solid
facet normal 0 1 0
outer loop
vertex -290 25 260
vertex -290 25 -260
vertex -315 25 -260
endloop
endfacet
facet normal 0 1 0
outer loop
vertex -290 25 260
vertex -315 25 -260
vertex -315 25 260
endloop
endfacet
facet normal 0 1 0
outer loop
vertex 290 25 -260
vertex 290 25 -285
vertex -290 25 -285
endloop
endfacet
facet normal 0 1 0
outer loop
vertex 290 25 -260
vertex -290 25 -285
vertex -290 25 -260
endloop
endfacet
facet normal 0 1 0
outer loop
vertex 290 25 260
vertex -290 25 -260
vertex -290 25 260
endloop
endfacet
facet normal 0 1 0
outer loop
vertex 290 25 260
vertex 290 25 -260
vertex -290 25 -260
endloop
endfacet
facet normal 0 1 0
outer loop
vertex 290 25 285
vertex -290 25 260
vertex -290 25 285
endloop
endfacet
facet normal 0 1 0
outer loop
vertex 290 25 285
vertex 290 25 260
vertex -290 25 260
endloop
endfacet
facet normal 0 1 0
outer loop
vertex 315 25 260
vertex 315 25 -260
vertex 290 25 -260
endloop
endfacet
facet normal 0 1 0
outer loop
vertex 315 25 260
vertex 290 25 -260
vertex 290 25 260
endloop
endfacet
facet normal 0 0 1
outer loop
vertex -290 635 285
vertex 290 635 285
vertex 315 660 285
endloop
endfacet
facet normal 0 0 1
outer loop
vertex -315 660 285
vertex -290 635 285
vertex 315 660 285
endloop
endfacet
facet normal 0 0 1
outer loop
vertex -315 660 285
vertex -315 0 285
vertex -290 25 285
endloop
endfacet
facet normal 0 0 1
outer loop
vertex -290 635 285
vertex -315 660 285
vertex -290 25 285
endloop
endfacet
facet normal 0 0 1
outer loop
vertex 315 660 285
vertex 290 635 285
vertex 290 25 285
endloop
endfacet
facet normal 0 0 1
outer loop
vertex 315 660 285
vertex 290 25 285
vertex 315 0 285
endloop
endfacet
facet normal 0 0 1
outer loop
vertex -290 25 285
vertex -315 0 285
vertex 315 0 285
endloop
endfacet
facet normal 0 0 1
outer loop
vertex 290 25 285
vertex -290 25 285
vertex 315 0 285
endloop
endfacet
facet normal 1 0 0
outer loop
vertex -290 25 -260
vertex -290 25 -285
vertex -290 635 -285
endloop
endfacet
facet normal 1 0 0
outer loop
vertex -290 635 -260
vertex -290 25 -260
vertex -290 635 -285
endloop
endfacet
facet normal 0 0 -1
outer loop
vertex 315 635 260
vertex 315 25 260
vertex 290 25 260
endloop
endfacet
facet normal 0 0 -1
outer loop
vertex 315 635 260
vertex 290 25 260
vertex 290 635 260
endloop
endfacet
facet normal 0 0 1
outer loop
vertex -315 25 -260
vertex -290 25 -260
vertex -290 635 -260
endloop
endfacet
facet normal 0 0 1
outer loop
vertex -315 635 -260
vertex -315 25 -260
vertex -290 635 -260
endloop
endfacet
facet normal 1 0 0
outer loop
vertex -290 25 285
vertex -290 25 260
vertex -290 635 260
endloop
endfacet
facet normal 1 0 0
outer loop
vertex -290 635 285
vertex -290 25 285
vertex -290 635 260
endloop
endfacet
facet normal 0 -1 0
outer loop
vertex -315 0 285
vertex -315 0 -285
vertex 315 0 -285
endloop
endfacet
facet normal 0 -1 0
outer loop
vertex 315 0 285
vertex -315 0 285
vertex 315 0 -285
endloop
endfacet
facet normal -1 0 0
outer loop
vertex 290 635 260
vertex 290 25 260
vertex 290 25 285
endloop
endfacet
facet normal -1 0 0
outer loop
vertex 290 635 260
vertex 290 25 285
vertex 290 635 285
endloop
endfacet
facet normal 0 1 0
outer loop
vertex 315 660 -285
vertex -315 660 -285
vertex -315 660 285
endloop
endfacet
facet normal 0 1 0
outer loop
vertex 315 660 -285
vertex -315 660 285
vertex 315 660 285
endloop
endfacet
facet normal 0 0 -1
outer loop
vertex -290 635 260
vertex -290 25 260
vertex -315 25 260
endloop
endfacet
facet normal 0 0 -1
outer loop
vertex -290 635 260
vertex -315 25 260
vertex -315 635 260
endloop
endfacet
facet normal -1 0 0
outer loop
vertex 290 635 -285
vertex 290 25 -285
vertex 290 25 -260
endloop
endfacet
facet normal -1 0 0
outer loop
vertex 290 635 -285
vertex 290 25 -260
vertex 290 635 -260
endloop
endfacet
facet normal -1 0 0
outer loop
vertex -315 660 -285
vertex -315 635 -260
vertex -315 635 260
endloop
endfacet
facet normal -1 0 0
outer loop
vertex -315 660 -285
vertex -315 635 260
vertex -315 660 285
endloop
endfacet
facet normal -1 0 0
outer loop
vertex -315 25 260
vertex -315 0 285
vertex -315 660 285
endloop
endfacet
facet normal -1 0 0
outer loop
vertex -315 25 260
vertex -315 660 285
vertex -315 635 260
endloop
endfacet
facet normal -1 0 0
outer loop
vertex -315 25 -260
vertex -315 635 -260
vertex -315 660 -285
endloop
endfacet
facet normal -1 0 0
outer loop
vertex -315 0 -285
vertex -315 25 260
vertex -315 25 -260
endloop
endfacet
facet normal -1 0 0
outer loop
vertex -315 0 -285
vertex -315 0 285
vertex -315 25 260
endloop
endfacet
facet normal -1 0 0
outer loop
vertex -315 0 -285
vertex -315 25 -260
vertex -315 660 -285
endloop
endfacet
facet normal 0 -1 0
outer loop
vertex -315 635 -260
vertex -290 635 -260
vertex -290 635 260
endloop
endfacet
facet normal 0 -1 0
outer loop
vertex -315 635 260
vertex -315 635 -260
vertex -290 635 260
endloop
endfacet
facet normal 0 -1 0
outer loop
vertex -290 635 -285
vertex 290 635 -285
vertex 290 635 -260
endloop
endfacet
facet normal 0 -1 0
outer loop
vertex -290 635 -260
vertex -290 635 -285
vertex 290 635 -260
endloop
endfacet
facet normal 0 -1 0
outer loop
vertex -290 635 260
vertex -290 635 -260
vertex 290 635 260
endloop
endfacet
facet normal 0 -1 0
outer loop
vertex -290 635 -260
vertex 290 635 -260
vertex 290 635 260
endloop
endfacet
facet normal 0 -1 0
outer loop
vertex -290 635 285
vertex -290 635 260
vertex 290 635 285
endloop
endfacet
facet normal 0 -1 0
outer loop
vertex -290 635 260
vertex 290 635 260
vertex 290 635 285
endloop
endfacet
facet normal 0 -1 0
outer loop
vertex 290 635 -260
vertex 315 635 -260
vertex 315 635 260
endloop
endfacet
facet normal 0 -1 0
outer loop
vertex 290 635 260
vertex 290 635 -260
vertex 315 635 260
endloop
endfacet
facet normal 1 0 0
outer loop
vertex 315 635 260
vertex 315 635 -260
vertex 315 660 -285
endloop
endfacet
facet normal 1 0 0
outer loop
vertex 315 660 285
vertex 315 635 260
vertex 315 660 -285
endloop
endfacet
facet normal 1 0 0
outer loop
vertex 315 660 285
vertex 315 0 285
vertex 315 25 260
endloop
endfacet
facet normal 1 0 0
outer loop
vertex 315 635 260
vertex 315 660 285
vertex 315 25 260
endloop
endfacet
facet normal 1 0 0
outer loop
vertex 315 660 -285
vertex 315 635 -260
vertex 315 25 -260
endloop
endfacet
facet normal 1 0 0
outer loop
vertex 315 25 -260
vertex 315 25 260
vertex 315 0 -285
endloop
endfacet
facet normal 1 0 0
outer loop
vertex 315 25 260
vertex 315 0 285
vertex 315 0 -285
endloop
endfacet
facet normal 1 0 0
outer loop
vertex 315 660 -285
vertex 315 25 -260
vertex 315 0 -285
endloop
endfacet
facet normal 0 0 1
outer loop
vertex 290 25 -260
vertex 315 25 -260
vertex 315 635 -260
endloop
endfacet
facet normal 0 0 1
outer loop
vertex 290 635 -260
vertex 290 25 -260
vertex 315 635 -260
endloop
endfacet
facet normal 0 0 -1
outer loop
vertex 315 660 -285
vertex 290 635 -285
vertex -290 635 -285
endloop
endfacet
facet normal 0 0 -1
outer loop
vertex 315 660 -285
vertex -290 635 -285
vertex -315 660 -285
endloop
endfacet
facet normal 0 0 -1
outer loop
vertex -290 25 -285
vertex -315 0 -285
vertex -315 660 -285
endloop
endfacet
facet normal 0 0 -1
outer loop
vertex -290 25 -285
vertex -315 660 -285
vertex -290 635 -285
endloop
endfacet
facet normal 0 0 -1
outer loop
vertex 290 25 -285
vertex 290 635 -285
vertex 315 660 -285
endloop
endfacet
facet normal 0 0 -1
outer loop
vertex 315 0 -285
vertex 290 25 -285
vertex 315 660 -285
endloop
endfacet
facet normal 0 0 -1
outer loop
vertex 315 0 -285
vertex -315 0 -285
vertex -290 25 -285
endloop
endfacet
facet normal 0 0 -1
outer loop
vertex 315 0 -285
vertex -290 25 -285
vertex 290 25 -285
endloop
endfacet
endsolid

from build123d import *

# Parameters (mm, degrees)
SKETCH2_W               = 630
SKETCH2_H               = 570
BOSS_EXTRUDE1_DEPTH     = 660
CUT_EXTRUDE1_DEPTH      = 928.213567632
CUT_EXTRUDE1_DEPTH_BACK = 928.213567632
SKETCH4_W               = 580
SKETCH4_H               = 610
CUT_EXTRUDE2_DEPTH      = 956.889637981
CUT_EXTRUDE2_DEPTH_BACK = 956.889637981
SKETCH5_W               = 520
SKETCH5_H               = 610


with BuildPart() as part:
    # Sketch2 → Boss-Extrude1 (new body)
    with BuildSketch(Plane(origin=(0, 0, 0), x_dir=(1, 0, 0), z_dir=(0, 1, 0))):
        Rectangle(SKETCH2_W, SKETCH2_H)
    extrude(amount=BOSS_EXTRUDE1_DEPTH)

    # Sketch4 → Cut-Extrude1 (cut, two sides: drawn at the far end of the back side and taken through both)
    with BuildSketch(Plane.XY.offset(285).offset(-CUT_EXTRUDE1_DEPTH_BACK)):
        with Locations((0, 330)):
            Rectangle(SKETCH4_W, SKETCH4_H)
    extrude(amount=CUT_EXTRUDE1_DEPTH + CUT_EXTRUDE1_DEPTH_BACK, mode=Mode.SUBTRACT)

    # Sketch5 → Cut-Extrude2 (cut, two sides: drawn at the far end of the back side and taken through both)
    with BuildSketch(Plane.ZY.offset(315).offset(-CUT_EXTRUDE2_DEPTH_BACK)):
        with Locations((0, 330)):
            Rectangle(SKETCH5_W, SKETCH5_H)
    extrude(amount=CUT_EXTRUDE2_DEPTH + CUT_EXTRUDE2_DEPTH_BACK, mode=Mode.SUBTRACT)


solid = part.part
